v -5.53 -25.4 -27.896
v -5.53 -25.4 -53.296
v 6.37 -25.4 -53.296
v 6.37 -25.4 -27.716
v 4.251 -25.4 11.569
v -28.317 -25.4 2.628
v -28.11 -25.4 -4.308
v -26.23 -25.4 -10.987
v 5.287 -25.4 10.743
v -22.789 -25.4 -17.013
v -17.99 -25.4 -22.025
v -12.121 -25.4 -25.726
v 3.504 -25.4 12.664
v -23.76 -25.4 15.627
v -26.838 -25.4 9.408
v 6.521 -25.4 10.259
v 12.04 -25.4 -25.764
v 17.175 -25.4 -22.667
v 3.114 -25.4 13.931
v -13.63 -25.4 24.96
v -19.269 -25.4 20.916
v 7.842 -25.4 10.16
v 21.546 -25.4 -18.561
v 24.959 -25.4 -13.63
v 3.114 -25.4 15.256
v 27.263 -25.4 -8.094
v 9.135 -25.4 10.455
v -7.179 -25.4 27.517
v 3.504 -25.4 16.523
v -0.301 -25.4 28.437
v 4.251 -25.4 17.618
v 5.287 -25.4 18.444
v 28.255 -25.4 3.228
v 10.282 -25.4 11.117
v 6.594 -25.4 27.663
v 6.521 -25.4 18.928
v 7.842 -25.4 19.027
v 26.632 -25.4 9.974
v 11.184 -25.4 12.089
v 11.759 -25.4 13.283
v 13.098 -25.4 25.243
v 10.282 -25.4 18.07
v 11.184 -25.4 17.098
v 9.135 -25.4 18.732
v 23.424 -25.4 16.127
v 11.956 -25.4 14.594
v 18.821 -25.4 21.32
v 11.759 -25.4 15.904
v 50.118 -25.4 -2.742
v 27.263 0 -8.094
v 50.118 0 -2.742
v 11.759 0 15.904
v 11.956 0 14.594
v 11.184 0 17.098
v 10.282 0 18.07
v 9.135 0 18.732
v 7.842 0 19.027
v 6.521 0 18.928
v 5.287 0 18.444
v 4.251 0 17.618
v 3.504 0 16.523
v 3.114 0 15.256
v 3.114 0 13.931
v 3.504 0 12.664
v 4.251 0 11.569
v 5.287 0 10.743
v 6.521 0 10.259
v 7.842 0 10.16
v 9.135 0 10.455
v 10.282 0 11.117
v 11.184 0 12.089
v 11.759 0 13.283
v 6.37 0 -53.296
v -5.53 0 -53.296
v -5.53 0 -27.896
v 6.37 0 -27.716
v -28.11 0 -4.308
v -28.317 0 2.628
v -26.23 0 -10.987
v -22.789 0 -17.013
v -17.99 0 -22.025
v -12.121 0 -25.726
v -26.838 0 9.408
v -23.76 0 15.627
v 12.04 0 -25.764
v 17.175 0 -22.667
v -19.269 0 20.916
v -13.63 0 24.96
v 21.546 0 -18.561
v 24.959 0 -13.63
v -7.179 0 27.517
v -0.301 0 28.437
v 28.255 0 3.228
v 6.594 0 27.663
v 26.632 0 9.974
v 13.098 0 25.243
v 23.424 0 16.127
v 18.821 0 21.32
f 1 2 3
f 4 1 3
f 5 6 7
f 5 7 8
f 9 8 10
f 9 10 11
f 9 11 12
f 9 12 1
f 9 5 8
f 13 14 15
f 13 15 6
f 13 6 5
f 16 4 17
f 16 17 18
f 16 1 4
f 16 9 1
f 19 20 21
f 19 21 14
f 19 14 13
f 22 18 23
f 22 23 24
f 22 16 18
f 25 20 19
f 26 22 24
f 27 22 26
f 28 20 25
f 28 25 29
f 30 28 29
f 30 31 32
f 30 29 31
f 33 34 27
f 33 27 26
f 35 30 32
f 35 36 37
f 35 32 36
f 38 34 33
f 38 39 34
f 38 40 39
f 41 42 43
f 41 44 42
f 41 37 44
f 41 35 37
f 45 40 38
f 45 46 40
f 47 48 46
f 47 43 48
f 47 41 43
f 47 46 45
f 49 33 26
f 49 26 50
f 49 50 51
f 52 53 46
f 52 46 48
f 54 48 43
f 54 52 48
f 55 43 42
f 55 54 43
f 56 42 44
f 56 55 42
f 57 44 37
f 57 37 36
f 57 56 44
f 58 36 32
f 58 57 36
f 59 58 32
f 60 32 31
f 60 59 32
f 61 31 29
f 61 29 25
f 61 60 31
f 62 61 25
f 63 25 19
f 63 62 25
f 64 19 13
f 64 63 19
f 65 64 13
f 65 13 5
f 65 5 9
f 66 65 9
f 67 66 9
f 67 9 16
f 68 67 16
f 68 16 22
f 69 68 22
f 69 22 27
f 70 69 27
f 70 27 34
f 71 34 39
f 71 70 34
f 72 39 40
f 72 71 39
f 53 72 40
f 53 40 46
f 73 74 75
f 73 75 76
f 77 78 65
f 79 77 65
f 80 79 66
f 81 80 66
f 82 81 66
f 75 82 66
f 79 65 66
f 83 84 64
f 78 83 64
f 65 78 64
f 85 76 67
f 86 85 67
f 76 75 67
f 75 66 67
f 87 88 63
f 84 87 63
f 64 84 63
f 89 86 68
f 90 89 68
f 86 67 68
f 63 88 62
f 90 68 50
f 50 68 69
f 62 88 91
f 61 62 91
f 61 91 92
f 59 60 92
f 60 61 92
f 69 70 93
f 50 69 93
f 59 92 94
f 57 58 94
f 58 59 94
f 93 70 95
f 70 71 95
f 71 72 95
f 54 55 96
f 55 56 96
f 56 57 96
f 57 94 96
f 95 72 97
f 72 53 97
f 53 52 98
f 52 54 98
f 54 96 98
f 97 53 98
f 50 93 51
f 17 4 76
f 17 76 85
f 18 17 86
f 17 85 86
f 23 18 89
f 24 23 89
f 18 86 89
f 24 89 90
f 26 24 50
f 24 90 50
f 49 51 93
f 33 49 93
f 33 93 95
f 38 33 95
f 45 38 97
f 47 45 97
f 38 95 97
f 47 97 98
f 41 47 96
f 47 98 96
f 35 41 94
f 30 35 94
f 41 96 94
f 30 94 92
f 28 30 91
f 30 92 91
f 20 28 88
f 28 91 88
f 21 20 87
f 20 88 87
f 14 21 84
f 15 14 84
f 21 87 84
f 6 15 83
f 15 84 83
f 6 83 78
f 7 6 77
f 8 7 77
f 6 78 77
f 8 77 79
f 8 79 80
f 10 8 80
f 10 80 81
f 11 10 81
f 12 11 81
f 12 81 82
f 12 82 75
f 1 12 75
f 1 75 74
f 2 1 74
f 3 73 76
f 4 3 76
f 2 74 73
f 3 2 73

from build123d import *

# Parameters (mm, degrees)
F0_R     = 4.446176
F1_DEPTH = 25.4


with BuildPart() as f1:
    # F0 (on Front) → F1 (new body)
    with BuildSketch(Plane.XZ):
        with BuildLine():
            ThreePointArc((27.262543, -8.093622), (28.143037, -4.089309), (28.438582, 0))
            ThreePointArc((28.438582, 0), (28.392606, 1.616437), (28.254827, 3.227648))
            ThreePointArc((28.254827, 3.227648), (-19.268549, 20.915926), (-5.529564, -27.895822))
            ThreePointArc((-5.529564, -27.895822), (0.429583, -28.435337), (6.369713, -27.716055))
            ThreePointArc((6.369713, -27.716055), (19.469004, -20.729468), (27.262543, -8.093622))
        make_face()
        with Locations((7.510159, 14.593512)):
            Circle(F0_R, mode=Mode.SUBTRACT)
        with BuildLine():
            ThreePointArc((28.254827, 3.227648), (28.392606, 1.616437), (28.438582, 0))
            ThreePointArc((28.438582, 0), (28.143037, -4.089309), (27.262543, -8.093622))
            Line((27.262543, -8.093622), (50.118111, -2.741527))
            Line((50.118111, -2.741527), (28.254827, 3.227648))
        make_face()
        with BuildLine():
            ThreePointArc((6.369713, -27.716055), (0.429583, -28.435337), (-5.529564, -27.895822))
            Line((-5.529564, -27.895822), (-5.529564, -53.295822))
            Line((-5.529564, -53.295822), (6.369713, -53.295822))
            Line((6.369713, -53.295822), (6.369713, -27.716055))
        make_face()
    extrude(amount=F1_DEPTH)


solid = f1.part
